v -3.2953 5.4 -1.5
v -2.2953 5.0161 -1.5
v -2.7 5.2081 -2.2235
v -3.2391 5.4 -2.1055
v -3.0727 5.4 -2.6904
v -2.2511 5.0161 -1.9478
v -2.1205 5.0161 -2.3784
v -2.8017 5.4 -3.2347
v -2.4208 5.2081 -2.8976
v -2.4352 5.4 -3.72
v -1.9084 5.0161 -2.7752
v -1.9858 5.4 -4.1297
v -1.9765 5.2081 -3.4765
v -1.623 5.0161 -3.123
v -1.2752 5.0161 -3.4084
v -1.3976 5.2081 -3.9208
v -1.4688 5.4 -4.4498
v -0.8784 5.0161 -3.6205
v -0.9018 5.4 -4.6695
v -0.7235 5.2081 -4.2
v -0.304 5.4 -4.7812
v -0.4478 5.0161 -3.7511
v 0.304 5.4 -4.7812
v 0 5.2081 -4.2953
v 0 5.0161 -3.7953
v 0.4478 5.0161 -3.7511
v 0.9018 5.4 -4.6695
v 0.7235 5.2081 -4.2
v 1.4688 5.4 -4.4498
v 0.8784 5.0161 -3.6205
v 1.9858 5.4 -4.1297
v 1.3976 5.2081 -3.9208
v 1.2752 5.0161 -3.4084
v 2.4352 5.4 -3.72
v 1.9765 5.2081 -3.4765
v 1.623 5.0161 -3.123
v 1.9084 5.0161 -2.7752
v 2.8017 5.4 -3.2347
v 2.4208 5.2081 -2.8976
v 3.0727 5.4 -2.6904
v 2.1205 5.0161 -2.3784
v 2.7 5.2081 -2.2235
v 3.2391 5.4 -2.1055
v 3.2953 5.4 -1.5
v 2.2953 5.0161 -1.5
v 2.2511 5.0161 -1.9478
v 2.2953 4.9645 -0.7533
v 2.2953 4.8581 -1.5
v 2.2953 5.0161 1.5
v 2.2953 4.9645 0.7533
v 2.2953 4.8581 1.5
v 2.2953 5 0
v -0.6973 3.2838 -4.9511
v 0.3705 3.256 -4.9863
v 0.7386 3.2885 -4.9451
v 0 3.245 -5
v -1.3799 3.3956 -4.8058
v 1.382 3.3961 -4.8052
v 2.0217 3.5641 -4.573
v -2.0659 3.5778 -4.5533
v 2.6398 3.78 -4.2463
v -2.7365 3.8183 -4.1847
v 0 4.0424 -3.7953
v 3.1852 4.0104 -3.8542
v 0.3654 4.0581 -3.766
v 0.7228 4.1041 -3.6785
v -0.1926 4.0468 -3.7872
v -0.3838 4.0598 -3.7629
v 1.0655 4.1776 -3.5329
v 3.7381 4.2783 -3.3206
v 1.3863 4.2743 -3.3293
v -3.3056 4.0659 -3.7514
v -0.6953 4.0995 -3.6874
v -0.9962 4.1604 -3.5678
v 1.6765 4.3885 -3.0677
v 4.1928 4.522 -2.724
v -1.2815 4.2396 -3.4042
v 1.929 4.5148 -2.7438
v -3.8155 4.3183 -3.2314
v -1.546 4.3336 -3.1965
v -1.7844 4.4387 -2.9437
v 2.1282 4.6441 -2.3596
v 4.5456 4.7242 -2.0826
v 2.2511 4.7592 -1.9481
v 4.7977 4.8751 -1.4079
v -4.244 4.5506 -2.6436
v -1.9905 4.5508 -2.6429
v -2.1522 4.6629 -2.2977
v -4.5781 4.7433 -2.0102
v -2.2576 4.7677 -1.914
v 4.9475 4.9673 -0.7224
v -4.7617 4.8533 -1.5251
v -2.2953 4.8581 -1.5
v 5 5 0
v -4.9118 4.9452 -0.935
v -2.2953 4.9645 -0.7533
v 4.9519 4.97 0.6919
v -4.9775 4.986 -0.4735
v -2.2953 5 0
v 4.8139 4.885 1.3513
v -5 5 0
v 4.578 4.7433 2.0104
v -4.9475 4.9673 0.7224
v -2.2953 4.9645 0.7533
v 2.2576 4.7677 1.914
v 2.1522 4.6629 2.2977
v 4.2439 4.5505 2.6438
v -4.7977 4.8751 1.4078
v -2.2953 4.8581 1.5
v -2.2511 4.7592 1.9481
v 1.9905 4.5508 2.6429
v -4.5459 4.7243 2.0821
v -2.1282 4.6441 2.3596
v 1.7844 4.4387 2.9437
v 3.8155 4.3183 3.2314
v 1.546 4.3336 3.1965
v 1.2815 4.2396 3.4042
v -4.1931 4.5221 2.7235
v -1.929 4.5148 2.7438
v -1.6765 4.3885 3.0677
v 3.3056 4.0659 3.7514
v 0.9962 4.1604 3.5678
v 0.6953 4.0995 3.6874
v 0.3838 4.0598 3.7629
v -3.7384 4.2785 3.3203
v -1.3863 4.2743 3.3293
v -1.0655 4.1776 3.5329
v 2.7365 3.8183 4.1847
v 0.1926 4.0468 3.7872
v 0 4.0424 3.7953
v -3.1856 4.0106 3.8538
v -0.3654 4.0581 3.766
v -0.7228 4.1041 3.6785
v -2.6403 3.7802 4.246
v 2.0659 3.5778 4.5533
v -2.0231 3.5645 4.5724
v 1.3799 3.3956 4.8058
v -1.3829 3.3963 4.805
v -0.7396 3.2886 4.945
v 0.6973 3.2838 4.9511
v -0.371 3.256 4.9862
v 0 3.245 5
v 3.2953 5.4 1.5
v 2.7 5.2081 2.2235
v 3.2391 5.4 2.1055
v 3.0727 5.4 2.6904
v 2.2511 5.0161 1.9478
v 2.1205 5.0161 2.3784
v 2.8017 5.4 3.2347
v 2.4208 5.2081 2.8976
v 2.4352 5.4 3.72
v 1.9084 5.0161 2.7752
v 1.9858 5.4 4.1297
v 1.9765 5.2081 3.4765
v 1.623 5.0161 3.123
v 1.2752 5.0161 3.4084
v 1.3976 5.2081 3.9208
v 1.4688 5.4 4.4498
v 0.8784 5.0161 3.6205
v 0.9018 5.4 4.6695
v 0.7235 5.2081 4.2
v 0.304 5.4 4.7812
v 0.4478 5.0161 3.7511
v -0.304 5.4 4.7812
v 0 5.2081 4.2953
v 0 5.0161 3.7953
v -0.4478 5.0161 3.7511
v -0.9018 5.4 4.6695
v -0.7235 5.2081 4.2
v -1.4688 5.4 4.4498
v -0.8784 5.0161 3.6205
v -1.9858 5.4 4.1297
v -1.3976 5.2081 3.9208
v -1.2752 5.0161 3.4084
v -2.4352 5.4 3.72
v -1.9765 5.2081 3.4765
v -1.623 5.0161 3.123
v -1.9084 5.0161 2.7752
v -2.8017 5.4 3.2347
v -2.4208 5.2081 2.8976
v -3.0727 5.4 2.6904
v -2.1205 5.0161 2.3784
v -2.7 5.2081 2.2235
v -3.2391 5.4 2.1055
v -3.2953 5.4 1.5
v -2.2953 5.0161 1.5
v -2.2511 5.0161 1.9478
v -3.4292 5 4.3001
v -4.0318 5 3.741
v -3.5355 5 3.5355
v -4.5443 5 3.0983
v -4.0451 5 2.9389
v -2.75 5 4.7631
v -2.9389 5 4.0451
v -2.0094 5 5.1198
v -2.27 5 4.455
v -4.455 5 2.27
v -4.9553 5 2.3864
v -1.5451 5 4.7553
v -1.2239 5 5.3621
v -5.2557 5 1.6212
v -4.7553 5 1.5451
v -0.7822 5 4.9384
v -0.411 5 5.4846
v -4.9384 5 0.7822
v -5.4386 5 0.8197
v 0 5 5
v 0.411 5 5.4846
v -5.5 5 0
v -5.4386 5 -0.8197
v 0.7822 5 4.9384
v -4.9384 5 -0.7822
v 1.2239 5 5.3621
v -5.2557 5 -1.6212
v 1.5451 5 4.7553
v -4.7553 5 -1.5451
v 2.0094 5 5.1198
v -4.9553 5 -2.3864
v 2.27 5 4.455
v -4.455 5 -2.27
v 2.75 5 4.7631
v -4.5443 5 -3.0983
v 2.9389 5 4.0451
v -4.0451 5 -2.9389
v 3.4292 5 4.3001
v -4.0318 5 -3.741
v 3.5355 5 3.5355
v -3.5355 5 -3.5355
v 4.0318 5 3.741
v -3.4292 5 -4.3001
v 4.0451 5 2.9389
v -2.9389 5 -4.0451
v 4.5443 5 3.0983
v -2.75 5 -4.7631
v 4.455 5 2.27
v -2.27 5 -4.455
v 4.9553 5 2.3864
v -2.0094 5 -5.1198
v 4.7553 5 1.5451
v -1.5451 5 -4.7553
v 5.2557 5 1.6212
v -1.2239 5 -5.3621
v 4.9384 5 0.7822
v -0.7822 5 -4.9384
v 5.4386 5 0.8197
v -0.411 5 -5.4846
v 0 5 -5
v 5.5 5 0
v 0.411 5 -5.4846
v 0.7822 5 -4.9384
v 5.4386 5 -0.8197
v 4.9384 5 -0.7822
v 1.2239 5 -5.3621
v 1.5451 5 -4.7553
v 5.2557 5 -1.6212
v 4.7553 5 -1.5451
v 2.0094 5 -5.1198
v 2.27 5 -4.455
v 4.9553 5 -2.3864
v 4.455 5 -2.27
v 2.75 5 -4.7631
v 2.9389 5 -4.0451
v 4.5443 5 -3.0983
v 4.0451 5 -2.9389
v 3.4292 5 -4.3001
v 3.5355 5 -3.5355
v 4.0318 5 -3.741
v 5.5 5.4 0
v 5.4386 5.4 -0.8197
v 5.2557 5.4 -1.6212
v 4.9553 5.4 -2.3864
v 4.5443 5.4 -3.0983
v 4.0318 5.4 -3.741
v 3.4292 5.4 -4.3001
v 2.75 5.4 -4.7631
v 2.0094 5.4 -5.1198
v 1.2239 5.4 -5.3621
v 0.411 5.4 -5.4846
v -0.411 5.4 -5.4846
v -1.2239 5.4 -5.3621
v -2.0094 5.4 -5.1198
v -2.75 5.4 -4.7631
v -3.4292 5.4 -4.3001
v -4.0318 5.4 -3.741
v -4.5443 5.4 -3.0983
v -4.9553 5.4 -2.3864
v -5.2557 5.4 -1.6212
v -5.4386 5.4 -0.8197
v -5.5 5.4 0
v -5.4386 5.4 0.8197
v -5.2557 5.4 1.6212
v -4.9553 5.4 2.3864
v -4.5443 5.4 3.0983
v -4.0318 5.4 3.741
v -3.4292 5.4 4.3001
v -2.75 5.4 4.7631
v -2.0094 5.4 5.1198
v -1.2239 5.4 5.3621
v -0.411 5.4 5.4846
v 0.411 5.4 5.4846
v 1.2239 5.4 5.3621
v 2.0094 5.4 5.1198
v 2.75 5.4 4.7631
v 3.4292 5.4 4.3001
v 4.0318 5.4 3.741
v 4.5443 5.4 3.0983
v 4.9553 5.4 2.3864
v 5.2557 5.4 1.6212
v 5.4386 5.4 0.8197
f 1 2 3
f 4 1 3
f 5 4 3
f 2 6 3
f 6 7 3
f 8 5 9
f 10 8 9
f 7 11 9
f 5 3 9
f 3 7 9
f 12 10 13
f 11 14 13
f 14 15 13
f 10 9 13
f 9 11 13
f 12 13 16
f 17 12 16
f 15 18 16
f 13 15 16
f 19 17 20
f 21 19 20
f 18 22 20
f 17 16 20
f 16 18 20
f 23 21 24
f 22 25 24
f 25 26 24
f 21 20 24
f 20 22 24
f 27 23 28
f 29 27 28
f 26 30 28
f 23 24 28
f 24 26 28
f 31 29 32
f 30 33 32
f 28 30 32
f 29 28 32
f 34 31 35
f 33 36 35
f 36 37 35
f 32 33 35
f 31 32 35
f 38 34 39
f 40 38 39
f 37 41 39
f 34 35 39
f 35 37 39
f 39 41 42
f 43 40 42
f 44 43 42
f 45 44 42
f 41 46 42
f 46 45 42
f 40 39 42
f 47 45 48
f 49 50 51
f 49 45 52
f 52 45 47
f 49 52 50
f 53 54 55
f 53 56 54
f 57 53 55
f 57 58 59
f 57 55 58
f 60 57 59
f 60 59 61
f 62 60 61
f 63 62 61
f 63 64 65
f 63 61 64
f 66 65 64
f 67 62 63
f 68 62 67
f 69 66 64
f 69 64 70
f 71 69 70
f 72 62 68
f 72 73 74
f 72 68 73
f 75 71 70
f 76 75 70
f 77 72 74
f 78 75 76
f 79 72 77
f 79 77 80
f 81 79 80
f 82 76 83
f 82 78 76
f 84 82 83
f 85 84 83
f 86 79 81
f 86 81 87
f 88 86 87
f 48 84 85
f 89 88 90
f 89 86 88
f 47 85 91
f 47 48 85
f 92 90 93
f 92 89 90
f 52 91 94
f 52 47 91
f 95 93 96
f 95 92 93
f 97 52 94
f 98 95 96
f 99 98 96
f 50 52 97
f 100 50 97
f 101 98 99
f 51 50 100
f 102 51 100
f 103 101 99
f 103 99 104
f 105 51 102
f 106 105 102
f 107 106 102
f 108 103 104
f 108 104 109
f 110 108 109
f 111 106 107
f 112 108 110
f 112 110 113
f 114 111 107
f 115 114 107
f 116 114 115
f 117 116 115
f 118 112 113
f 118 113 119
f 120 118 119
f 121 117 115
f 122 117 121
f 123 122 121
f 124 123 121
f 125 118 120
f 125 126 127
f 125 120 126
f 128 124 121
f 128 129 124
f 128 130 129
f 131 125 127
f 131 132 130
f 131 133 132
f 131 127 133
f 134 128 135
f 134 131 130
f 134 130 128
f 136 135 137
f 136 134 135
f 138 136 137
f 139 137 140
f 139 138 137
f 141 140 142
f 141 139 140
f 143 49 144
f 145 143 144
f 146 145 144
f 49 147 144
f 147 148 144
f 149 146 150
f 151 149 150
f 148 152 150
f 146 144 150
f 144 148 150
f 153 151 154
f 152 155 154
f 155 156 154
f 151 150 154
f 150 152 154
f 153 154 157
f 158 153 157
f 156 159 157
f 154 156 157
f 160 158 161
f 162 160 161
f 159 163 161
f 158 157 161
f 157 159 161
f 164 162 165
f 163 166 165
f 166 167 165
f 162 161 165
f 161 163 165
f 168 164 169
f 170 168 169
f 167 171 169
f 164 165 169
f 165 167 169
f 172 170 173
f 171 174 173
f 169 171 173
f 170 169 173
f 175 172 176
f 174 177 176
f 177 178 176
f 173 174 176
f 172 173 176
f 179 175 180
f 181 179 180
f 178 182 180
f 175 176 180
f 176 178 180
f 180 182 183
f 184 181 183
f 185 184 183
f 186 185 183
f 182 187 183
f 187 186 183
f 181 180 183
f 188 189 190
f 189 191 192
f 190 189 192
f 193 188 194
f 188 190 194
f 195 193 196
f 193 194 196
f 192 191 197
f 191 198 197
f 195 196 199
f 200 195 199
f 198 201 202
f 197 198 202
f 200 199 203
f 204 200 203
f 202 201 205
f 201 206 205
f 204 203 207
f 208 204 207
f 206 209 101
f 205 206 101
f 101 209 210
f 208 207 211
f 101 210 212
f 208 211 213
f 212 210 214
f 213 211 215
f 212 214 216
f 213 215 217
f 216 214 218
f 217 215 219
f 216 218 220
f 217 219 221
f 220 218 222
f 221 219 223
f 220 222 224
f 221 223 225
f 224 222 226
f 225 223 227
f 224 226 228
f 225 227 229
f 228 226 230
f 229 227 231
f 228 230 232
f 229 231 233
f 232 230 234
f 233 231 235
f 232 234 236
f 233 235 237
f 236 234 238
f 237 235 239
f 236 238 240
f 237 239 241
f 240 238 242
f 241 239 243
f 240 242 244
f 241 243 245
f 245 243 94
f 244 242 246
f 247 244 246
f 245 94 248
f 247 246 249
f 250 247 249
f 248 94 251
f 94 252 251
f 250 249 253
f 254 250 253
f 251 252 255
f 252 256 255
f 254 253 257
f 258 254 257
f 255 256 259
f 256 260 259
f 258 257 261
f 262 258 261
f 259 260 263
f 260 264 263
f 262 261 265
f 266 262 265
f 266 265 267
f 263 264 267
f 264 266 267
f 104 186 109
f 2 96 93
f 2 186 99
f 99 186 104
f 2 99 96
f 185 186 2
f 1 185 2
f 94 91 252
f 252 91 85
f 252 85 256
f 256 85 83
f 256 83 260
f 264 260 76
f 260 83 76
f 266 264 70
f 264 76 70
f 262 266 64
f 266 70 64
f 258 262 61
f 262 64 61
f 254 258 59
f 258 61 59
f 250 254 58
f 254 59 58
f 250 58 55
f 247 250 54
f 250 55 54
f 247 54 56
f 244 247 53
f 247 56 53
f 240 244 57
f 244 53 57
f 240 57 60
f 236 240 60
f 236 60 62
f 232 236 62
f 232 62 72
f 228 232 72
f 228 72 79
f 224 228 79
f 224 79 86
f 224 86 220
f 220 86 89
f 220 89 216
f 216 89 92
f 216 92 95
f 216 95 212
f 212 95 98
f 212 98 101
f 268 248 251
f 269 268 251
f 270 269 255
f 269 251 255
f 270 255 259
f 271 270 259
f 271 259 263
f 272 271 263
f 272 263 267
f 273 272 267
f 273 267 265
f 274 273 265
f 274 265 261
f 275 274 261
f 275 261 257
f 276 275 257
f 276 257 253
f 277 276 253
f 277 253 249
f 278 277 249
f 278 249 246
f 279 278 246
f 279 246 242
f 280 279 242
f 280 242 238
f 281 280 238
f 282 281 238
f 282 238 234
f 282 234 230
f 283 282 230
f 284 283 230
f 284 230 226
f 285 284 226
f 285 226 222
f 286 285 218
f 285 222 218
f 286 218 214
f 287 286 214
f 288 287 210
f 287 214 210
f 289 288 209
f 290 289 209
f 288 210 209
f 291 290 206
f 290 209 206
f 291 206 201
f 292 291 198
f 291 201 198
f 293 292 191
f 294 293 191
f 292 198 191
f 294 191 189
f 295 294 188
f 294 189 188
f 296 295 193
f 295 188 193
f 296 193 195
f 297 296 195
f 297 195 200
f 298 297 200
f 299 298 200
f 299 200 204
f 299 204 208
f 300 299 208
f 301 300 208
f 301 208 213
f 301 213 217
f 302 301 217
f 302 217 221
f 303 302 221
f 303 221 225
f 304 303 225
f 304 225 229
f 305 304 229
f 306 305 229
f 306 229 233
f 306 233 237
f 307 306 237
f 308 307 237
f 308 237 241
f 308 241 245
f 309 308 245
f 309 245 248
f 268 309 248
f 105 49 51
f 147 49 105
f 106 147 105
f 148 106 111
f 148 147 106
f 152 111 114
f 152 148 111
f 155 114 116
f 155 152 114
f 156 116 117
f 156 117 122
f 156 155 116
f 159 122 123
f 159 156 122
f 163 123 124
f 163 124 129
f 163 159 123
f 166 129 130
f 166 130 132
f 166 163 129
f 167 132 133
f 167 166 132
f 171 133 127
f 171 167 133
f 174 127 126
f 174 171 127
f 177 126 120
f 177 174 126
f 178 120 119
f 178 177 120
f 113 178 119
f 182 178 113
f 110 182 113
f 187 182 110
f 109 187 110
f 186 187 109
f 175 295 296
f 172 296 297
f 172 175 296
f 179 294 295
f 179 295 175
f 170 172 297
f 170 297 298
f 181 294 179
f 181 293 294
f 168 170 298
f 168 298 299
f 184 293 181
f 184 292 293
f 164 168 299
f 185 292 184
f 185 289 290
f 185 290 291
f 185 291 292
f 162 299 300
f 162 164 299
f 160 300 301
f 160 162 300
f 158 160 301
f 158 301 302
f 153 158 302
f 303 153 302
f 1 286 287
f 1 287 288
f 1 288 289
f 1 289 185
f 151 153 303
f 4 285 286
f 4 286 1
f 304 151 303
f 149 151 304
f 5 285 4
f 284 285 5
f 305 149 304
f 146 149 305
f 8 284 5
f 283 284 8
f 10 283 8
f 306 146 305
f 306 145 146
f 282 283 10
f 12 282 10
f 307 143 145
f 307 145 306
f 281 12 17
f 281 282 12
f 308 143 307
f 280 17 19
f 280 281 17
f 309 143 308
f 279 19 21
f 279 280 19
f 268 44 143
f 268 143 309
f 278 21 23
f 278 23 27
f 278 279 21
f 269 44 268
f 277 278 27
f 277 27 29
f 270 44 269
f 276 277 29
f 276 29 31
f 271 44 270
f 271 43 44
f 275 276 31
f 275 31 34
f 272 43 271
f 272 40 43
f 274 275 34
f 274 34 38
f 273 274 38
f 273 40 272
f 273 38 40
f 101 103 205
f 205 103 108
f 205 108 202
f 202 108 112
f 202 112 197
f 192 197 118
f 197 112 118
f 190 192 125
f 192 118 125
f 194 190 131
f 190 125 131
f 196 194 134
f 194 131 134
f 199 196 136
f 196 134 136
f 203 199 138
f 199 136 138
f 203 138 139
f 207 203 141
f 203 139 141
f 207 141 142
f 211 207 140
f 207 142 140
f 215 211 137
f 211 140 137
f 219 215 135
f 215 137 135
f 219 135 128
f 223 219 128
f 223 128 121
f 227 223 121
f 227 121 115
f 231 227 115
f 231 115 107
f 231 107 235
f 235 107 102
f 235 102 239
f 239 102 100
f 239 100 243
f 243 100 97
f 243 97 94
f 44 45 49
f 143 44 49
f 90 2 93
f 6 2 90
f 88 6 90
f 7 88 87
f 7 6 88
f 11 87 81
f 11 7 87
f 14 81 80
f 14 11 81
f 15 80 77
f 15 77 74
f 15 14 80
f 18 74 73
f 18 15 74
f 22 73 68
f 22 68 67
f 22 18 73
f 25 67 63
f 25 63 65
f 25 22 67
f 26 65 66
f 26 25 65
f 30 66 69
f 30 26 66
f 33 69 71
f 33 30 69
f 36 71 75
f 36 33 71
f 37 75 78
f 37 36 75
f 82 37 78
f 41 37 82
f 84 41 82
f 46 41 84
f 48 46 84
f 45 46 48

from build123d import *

# Parameters (mm, degrees)
SKETCH1_R               = 5
BOSS_EXTRUDE1_DEPTH     = 5
SKETCH2_R               = 5.5
BOSS_EXTRUDE2_DEPTH     = 0.4
CUT_EXTRUDE1_DEPTH      = 6.4
SKETCH5_R               = 8
CUT_EXTRUDE2_DEPTH      = 6.5
CUT_EXTRUDE2_DEPTH_BACK = 6.5
CHAMFER4_SIZE           = 1
CHAMFER4_SIZE2          = 0.383864035


with BuildPart() as part:
    # Sketch1 → Boss-Extrude1 (new body)
    with BuildSketch(Plane(origin=(0, 0, 0), x_dir=(1, 0, 0), z_dir=(0, 1, 0))):
        Circle(SKETCH1_R)
    extrude(amount=BOSS_EXTRUDE1_DEPTH)

    # Sketch2 → Boss-Extrude2 (add)
    with BuildSketch(Plane(origin=(0, 5, 0), x_dir=(1, 0, 0), z_dir=(0, 1, 0))):
        Circle(SKETCH2_R)
    extrude(amount=BOSS_EXTRUDE2_DEPTH)

    # Sketch4 → Cut-Extrude1 (cut, through all)
    with BuildSketch(Plane(origin=(0, 5.4, 0), x_dir=(1, 0, 0), z_dir=(0, 1, 0))):
        with BuildLine():
            Line((2.295250379, 1.5), (2.295250379, -1.5))
            ThreePointArc((2.295250379, -1.5), (0, -3.795250379), (-2.295250379, -1.5))
            Line((-2.295250379, -1.5), (-2.295250379, 1.5))
            ThreePointArc((-2.295250379, 1.5), (0, 3.795250379), (2.295250379, 1.5))
        make_face()
    extrude(amount=-CUT_EXTRUDE1_DEPTH, mode=Mode.SUBTRACT)

    # Sketch5 → Cut-Extrude2 (cut, two sides)
    with BuildSketch(Plane(origin=(0, 0, 0), x_dir=(0, 0, -1), z_dir=(1, 0, 0))) as cut_extrude2_sk:
        with Locations((0, -3)):
            Circle(SKETCH5_R)
    extrude(amount=CUT_EXTRUDE2_DEPTH, mode=Mode.SUBTRACT)
    extrude(cut_extrude2_sk.sketch, amount=-CUT_EXTRUDE2_DEPTH_BACK, mode=Mode.SUBTRACT)

    # Chamfer4
    chamfer4_edges = [part.edges().sort_by_distance(p)[0] for p in [
        (0, 5.4, -3.795250379),
        (-2.295250379, 5.4, 0),
        (0, 5.4, 3.795250379),
        (2.295250379, 5.4, 0),
    ]]
    chamfer4_side = [part.faces().sort_by_distance(p)[0] for p in [
        (-5.344436508, 5.4, 0),
    ]]
    chamfer(chamfer4_edges, length=CHAMFER4_SIZE, length2=CHAMFER4_SIZE2, reference=chamfer4_side[0])


solid = part.part
